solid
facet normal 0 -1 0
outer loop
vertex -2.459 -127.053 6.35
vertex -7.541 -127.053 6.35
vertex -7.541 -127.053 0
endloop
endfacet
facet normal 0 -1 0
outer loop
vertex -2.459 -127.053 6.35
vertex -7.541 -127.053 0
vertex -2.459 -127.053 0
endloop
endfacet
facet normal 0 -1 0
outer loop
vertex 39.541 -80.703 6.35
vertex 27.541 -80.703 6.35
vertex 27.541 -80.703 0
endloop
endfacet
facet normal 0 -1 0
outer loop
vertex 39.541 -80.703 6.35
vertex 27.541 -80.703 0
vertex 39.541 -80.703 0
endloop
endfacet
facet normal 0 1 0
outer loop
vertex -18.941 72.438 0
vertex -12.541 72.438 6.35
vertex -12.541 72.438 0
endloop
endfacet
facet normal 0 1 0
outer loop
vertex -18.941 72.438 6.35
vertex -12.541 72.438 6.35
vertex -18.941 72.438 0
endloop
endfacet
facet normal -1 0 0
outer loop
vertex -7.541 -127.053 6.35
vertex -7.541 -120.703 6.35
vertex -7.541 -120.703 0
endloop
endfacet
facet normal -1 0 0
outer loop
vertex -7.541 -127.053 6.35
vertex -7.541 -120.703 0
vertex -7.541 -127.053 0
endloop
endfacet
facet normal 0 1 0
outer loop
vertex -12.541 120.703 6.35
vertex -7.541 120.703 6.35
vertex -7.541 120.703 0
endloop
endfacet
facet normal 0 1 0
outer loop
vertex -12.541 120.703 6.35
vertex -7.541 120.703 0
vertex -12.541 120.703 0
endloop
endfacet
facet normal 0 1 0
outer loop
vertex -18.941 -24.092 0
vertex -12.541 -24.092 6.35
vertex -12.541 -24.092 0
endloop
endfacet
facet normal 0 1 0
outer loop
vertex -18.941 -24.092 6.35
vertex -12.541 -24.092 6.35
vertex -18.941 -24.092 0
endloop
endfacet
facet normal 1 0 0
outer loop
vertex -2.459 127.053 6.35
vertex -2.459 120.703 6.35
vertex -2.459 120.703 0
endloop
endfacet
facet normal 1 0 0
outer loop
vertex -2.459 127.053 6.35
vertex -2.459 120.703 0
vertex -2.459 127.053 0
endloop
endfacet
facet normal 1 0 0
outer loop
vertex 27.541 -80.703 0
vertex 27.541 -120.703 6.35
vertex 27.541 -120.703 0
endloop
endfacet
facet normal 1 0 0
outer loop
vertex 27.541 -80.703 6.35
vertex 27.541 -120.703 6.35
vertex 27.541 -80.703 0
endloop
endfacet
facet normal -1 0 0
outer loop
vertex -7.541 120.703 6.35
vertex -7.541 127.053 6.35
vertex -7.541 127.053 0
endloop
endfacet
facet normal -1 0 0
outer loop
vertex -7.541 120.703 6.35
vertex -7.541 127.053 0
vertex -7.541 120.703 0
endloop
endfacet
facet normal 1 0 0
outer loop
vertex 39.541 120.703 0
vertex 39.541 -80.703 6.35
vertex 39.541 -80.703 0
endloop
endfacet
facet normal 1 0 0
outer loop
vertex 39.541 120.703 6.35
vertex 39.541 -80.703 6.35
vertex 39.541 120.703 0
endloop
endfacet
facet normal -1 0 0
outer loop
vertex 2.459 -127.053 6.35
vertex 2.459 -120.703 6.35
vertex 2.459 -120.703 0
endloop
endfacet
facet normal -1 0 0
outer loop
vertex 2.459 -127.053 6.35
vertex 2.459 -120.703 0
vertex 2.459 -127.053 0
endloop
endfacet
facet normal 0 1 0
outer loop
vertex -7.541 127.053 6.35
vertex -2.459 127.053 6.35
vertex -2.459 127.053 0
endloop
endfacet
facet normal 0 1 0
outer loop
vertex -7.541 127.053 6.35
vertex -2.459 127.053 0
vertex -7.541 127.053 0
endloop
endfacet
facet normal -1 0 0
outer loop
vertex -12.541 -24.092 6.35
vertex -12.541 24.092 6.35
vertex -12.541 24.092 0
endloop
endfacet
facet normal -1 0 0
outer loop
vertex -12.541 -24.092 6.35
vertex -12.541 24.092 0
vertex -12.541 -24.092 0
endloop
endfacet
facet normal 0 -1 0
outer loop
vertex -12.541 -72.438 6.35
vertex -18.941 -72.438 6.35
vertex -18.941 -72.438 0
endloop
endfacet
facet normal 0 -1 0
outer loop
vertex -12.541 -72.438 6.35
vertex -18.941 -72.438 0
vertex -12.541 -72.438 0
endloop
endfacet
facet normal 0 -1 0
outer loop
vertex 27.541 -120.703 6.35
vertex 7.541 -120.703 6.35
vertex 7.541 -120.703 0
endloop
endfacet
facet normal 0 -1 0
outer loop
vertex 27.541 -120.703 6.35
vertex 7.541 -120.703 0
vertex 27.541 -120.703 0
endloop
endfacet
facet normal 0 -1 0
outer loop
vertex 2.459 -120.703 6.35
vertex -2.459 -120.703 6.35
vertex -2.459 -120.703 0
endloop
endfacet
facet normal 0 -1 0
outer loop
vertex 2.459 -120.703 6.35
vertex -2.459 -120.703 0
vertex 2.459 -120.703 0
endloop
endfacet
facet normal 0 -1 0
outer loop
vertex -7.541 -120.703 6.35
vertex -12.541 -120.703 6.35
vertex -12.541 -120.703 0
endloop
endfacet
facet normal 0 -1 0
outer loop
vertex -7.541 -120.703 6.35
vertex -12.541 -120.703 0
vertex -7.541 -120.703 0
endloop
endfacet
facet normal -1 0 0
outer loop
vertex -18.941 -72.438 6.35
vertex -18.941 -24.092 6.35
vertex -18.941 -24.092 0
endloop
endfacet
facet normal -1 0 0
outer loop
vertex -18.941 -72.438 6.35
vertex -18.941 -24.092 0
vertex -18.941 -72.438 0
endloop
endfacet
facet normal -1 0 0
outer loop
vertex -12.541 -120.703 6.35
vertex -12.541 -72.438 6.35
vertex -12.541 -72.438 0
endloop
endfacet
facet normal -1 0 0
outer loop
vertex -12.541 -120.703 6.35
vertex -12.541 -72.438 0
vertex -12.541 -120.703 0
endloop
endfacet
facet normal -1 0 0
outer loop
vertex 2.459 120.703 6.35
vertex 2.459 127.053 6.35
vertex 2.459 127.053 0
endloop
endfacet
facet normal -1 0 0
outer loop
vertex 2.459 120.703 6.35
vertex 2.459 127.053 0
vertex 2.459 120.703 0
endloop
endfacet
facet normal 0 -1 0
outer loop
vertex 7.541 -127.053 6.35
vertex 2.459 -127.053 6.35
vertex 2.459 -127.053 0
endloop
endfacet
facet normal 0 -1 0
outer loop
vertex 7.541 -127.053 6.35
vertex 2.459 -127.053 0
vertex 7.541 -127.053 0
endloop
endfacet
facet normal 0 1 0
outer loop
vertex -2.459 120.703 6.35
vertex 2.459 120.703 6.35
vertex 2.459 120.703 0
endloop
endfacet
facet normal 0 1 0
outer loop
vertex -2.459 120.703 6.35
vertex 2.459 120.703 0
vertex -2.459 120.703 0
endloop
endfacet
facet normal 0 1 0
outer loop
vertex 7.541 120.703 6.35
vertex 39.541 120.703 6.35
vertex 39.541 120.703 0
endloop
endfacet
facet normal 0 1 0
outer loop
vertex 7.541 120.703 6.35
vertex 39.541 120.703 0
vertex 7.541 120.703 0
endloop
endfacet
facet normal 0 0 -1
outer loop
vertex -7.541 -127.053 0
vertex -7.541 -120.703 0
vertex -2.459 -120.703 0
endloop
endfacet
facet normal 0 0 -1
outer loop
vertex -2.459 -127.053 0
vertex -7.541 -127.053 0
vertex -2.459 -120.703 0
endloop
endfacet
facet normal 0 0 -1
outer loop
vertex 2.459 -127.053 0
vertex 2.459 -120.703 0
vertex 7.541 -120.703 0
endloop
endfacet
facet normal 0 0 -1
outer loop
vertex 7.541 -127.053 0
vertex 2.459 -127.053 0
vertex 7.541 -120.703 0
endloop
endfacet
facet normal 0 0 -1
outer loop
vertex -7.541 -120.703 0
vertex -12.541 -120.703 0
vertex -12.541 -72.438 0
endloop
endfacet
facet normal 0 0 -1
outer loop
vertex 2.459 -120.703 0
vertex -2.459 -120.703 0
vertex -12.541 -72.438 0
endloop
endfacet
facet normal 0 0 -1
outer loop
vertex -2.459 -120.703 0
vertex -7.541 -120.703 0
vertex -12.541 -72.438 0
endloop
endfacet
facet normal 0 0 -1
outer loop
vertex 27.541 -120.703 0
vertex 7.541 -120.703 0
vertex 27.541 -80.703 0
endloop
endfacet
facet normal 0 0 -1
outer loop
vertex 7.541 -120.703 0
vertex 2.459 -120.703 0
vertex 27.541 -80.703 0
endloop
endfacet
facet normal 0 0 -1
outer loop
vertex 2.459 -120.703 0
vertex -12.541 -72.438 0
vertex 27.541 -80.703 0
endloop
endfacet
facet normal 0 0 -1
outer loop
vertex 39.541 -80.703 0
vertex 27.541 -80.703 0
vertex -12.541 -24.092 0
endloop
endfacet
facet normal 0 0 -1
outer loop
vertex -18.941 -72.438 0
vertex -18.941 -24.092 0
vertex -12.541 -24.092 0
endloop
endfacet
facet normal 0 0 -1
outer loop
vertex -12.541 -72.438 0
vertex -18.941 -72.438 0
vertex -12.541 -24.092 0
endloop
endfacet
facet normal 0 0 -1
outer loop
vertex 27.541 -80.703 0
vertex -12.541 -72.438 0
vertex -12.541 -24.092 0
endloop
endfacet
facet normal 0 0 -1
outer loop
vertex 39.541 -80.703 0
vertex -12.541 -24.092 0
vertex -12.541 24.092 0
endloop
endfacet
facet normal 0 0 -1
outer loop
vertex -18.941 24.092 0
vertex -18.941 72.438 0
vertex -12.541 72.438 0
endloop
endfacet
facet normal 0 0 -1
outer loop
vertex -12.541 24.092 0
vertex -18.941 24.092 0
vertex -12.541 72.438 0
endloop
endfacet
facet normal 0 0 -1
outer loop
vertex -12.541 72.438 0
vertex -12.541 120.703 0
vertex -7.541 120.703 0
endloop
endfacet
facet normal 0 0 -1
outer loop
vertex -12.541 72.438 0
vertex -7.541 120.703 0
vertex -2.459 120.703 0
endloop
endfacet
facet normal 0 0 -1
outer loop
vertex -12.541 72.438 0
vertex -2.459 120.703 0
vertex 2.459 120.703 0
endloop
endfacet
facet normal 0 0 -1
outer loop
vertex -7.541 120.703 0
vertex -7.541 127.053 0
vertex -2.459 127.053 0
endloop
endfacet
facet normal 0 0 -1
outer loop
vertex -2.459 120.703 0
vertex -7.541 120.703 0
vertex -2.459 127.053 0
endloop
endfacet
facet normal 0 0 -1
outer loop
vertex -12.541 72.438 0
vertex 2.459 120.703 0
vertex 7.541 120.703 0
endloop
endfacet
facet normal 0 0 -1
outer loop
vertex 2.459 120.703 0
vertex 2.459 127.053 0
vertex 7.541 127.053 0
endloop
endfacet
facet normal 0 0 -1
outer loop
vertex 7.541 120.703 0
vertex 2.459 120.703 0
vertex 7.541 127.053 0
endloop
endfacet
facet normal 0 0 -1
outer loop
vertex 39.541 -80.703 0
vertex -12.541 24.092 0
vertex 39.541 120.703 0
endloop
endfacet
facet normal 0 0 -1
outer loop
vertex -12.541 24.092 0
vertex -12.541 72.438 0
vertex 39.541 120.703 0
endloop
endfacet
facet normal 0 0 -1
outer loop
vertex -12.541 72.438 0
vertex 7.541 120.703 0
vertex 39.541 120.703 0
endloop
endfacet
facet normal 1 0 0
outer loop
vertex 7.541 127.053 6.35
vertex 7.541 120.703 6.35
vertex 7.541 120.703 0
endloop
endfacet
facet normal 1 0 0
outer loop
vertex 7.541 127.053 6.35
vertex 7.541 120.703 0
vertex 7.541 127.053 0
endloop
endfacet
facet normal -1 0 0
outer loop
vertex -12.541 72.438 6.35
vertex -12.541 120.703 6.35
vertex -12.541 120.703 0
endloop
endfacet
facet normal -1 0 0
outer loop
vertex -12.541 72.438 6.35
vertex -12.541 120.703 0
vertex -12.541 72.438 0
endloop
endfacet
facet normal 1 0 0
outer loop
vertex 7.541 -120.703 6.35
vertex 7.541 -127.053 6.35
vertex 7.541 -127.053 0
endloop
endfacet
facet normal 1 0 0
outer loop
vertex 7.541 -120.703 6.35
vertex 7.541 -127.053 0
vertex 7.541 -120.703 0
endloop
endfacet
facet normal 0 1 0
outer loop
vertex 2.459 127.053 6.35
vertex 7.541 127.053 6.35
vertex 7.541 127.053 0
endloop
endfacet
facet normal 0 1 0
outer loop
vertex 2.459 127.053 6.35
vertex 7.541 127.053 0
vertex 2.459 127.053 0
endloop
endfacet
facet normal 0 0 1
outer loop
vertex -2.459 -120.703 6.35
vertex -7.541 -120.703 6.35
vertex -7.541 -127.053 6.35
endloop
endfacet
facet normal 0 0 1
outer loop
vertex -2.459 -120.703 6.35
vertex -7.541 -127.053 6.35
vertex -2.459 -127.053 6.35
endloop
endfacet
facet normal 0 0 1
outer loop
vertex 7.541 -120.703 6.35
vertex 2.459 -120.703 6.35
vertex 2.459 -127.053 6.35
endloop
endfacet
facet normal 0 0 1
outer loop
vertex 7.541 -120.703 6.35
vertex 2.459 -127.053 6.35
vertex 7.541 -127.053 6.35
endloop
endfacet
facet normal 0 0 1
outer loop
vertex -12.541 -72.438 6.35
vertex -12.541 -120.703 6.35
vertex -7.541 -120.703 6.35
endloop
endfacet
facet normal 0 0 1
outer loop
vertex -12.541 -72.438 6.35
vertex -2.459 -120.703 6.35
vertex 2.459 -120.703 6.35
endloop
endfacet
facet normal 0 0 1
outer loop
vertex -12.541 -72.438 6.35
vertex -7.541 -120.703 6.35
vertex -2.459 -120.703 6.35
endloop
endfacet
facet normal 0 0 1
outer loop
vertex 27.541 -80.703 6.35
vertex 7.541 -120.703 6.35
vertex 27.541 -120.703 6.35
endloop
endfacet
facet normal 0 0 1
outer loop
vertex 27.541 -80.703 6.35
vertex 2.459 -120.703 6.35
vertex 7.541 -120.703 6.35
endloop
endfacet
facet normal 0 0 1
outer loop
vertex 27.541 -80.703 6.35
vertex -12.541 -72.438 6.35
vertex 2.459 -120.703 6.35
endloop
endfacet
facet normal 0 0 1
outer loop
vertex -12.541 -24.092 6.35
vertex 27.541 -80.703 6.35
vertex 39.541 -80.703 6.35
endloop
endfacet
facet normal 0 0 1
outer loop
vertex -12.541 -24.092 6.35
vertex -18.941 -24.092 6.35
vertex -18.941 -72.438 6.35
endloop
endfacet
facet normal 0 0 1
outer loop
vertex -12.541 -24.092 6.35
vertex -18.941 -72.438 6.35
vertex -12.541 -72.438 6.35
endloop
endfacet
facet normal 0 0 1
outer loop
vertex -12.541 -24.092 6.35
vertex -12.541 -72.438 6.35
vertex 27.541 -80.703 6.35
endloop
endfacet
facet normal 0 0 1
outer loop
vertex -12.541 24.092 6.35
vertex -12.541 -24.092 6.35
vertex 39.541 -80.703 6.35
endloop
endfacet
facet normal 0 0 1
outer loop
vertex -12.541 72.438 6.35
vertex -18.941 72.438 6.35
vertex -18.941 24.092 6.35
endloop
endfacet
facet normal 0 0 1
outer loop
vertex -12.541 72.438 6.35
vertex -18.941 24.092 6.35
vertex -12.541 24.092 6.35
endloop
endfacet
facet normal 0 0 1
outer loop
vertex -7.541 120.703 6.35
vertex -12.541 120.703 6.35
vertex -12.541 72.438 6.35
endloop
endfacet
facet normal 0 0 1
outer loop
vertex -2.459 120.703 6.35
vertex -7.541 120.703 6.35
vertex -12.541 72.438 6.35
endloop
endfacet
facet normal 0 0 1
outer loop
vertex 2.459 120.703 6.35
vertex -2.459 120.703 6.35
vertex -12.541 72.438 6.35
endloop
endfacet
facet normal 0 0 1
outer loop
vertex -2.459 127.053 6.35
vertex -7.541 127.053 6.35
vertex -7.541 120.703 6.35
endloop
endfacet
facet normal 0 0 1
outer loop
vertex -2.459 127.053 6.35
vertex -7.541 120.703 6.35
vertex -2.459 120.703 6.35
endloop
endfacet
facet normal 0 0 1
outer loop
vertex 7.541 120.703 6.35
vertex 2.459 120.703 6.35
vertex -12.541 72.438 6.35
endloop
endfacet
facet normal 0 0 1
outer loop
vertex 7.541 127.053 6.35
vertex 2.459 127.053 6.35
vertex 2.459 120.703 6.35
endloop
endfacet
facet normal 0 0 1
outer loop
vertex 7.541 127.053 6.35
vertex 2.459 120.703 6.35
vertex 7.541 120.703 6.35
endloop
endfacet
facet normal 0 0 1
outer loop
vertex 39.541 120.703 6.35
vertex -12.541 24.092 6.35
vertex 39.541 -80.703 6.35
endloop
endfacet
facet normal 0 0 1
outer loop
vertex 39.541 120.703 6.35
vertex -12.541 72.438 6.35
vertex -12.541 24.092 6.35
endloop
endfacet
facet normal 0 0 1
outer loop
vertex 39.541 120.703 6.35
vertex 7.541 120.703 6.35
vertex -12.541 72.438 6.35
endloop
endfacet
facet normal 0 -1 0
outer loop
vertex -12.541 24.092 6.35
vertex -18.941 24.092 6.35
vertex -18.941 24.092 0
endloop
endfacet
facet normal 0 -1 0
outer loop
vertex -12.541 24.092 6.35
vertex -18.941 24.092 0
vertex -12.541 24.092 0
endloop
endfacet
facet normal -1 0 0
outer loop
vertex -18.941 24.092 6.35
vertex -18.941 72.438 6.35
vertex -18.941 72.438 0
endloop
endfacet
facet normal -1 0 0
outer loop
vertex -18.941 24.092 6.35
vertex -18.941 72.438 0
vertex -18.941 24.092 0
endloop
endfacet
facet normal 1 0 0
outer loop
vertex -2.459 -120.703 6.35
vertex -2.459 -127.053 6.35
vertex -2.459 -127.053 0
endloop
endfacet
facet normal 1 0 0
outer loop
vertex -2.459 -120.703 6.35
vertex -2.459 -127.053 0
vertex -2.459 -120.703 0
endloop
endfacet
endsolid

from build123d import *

# Parameters (mm, degrees)
SKETCH1_W           = 5
SKETCH1_H           = 6.35
SKETCH1_W_2         = 25
SKETCH1_H_2         = 241.325
SKETCH1_W_3         = 6.4
SKETCH1_H_3         = 48.265
SKETCH1_W_4         = 15
SKETCH1_W_5         = 12
SKETCH1_H_4         = 201.325
BOSS_EXTRUDE1_DEPTH = 6.35
BOSS_EXTRUDE2_DEPTH = 6.35


with BuildPart() as part:
    # Sketch1 → Boss-Extrude1 (new body)
    with BuildSketch(Plane.XY):
        with Locations((-5, 123.8375)):
            Rectangle(SKETCH1_W, SKETCH1_H)
        with Locations((5, 123.8375)):
            Rectangle(SKETCH1_W, SKETCH1_H)
        Rectangle(SKETCH1_W_2, SKETCH1_H_2)
        with Locations((-15.7, 48.265)):
            Rectangle(SKETCH1_W_3, SKETCH1_H_3)
        with Locations((-15.7, -48.265)):
            Rectangle(SKETCH1_W_3, SKETCH1_H_3)
        with Locations((-5, -123.8375)):
            Rectangle(SKETCH1_W, SKETCH1_H)
        with Locations((5, -123.8375)):
            Rectangle(SKETCH1_W, SKETCH1_H)
        with Locations((20, 0)):
            Rectangle(SKETCH1_W_4, SKETCH1_H_2)
        with Locations((33.5, 20)):
            Rectangle(SKETCH1_W_5, SKETCH1_H_4)
    extrude(amount=BOSS_EXTRUDE1_DEPTH)

    # Sketch2 → Boss-Extrude2 (add)
    with BuildSketch(Plane.XY.offset(6.35)):
        Polygon((27.54064, -120.70314), (27.54064, -80.70314), (39.54064, -80.70314), (39.54064, 120.70314), (7.54064, 120.70314), (7.54064, 127.05314), (2.45936, 127.05314), (2.45936, 120.70314), (-2.45936, 120.70314), (-2.45936, 127.05314), (-7.54064, 127.05314), (-7.54064, 120.70314), (-12.54064, 120.70314), (-12.54064, 72.43814), (-18.94064, 72.43814), (-18.94064, 24.09186), (-12.54064, 24.09186), (-12.54064, -24.09186), (-18.94064, -24.09186), (-18.94064, -72.43814), (-12.54064, -72.43814), (-12.54064, -120.70314), (-7.54064, -120.70314), (-7.54064, -127.05314), (-2.45936, -127.05314), (-2.45936, -120.70314), (2.45936, -120.70314), (2.45936, -127.05314), (7.54064, -127.05314), (7.54064, -120.70314), align=None)
    extrude(amount=-BOSS_EXTRUDE2_DEPTH)


solid = part.part
